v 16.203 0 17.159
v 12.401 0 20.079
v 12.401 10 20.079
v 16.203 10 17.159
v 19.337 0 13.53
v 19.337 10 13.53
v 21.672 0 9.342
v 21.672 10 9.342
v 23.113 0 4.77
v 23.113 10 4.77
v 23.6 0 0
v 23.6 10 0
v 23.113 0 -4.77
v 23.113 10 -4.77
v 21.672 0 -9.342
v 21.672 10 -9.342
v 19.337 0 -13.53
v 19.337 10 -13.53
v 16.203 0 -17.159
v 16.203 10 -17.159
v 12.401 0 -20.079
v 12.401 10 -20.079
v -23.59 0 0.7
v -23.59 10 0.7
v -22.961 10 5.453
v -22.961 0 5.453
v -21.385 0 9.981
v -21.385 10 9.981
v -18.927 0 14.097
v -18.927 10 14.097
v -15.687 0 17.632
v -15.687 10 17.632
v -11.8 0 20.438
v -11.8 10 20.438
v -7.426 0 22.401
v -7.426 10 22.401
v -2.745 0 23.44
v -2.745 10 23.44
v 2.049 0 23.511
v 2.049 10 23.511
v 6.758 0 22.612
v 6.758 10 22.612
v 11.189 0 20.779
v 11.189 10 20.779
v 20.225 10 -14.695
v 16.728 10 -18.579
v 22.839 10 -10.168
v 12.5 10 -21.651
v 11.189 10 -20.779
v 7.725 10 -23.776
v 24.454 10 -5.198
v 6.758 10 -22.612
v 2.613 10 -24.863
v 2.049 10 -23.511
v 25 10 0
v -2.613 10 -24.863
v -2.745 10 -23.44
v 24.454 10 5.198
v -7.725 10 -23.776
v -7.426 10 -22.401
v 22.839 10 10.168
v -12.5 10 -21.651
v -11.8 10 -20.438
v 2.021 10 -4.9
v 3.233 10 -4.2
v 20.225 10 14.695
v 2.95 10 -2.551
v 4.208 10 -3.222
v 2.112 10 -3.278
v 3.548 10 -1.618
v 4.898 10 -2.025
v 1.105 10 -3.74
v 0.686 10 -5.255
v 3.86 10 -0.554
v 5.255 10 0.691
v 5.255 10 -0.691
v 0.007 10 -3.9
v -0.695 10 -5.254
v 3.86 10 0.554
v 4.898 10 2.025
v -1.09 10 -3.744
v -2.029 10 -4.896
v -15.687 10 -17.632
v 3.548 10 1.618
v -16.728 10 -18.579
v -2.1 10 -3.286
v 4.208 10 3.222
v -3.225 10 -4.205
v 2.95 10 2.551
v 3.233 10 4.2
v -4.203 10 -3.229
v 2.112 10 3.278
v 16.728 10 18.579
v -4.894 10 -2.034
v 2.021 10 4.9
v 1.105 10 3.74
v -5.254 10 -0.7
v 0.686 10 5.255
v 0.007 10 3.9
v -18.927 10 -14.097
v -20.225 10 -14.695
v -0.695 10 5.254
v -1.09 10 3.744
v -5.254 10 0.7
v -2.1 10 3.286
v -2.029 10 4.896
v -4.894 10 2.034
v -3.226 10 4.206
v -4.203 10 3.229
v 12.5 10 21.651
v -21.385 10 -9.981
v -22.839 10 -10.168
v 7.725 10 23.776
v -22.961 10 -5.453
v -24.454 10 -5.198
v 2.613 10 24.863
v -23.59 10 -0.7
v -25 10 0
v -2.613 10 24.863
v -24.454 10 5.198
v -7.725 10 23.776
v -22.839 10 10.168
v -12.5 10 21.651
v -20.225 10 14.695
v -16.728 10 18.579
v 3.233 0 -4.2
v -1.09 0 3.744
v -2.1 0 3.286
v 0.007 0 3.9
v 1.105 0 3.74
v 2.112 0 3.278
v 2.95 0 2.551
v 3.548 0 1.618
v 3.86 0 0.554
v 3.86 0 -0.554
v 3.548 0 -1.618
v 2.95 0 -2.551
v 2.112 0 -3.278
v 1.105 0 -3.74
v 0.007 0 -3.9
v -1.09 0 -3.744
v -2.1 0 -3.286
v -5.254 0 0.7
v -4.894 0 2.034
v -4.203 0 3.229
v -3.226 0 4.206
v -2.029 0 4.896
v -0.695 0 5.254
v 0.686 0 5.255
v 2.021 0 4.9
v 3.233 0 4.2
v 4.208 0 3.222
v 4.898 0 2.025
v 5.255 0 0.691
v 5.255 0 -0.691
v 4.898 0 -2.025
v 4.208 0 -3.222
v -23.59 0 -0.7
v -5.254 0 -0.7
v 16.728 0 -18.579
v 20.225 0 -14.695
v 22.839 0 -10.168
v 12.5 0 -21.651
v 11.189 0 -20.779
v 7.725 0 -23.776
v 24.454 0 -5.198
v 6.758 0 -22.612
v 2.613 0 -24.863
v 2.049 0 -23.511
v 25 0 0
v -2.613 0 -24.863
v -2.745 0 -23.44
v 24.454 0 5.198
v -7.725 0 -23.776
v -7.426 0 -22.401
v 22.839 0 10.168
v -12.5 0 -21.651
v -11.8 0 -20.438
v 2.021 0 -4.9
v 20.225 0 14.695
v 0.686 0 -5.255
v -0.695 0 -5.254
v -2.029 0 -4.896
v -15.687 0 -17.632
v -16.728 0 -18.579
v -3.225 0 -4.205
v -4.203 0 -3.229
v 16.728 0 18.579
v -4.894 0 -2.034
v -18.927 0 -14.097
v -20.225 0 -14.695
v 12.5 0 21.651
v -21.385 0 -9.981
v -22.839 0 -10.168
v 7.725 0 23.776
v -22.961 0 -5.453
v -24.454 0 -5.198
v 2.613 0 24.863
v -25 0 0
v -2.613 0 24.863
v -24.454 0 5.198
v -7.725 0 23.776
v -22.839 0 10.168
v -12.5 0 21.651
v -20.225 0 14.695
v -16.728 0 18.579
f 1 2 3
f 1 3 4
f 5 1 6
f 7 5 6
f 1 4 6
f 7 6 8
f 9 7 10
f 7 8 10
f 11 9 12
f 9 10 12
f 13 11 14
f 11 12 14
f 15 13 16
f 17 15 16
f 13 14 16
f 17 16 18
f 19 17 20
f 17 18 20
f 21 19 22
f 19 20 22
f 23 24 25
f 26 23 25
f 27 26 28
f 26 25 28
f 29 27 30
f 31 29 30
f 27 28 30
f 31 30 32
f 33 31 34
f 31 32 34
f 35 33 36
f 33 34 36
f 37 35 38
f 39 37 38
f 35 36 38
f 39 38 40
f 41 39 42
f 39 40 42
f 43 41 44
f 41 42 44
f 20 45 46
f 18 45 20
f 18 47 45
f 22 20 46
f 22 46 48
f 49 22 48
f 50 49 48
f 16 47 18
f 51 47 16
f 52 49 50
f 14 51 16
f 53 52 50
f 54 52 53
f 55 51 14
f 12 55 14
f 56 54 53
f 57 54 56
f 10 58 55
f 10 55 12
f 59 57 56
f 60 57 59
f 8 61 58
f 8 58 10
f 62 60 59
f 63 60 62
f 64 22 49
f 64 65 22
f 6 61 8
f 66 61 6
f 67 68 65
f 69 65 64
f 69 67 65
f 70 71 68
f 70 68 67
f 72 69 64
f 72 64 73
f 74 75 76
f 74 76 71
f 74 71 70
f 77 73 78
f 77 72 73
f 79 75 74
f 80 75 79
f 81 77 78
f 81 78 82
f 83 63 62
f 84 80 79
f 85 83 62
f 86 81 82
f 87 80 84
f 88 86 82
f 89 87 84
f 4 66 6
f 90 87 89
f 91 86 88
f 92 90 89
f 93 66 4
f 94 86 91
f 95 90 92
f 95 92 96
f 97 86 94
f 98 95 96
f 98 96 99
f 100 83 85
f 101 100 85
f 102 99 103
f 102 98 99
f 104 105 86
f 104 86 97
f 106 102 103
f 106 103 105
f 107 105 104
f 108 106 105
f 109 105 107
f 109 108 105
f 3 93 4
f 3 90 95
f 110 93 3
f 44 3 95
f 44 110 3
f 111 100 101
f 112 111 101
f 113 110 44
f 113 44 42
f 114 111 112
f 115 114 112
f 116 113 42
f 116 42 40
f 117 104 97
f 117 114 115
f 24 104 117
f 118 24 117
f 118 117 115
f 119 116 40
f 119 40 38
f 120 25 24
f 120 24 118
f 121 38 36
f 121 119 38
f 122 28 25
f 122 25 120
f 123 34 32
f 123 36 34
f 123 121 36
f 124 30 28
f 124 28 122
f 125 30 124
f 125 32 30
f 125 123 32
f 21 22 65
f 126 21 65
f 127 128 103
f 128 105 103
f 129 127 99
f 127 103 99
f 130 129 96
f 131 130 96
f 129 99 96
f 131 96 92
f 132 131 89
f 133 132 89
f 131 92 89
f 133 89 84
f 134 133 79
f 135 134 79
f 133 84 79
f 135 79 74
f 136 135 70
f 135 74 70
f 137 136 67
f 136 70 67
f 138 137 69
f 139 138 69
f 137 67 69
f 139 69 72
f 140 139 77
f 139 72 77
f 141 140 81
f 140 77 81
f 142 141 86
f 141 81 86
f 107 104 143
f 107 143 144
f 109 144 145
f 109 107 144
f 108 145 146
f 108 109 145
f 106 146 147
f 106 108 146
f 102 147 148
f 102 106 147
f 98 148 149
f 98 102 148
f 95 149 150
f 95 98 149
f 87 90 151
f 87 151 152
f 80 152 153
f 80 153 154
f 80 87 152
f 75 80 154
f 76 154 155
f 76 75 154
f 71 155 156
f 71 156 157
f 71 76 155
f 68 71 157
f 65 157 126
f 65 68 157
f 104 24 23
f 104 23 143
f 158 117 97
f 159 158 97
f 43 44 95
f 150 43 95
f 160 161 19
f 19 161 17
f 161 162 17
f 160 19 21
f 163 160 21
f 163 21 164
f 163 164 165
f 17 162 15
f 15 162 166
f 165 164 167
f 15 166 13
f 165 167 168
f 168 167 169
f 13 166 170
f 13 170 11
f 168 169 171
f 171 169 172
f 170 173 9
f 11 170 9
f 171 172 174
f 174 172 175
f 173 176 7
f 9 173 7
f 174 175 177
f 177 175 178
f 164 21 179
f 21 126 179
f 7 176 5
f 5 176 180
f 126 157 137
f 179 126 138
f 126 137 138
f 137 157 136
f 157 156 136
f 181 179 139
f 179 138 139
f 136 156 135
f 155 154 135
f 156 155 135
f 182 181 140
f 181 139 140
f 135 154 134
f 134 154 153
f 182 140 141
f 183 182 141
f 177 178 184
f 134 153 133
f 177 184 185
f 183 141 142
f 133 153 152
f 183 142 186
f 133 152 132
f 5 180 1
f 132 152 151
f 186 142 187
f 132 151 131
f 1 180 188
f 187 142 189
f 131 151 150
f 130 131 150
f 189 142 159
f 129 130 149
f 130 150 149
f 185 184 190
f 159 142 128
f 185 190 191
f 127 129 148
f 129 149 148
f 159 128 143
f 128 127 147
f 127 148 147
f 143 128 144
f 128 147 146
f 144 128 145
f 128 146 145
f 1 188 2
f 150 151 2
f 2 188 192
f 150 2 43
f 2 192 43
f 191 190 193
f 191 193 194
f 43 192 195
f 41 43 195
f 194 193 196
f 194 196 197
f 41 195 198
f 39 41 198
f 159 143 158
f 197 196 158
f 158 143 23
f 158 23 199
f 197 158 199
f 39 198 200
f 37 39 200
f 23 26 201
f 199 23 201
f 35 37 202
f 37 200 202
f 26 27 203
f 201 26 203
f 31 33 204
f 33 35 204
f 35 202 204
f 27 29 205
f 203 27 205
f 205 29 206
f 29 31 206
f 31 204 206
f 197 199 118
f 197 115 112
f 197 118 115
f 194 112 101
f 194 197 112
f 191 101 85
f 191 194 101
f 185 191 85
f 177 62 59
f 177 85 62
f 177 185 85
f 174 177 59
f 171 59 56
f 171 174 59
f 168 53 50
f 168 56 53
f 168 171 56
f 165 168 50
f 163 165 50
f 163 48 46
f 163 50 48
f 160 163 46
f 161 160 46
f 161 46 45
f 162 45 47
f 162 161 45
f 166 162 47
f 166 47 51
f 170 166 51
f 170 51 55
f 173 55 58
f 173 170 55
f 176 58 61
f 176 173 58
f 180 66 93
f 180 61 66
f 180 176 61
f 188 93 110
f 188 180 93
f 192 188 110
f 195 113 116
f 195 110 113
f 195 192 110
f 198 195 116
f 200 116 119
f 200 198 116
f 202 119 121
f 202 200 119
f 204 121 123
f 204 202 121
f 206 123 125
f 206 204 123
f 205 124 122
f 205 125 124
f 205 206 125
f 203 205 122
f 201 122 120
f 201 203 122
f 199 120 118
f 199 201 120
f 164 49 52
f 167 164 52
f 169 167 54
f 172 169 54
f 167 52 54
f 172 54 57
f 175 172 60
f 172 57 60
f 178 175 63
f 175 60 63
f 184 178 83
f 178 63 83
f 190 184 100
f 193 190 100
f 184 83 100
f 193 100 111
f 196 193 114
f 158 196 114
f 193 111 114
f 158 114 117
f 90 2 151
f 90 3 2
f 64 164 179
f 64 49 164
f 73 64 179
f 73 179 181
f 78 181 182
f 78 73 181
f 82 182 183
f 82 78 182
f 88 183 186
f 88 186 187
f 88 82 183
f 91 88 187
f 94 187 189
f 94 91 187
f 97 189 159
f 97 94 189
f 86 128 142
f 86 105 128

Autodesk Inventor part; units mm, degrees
ref_plane "YZ Plane" through (0, 0, 0) normal (1, 0, 0) x (0, 1, 0)
ref_plane "XZ Plane" through (0, 0, 0) normal (0, 1, 0) x (-1, 0, 0)
ref_plane "XY Plane" through (0, 0, 0) normal (0, 0, 1) x (1, 0, 0)
sketch "Sketch1" plane through (0, 0, 0) normal (0, 1, 0) x (-1, 0, 0)
  circle A0 centre (0, 0) radius 25
  dimension "d0" = 50
extrude "Extrusion1" add sketch "Sketch1" along normal blind 10
sketch "Sketch2" plane through (0, 10, 0) normal (0, 1, 0) x (1, 0, 0)
  arc A0 (-2.1, -3.2863) -> (-2.1, 3.2863) centre (0, 0) ccw
  line L0 (-2.1, -3.2863) -> (-2.1, 3.2863)
  dimension "d3" = 7.8
  dimension "d4" = 2.1
extrude "Extrusion2" cut sketch "Sketch2" against normal up to surface (10 mm away)
sketch "Sketch3" plane through (0, 10, 0) normal (0, 1, 0) x (1, 0, 0)
  line L0 (-2.1, -3.2863) -> (-2.1, 3.2863) projected
  arc A0 (-2.1, -3.2863) -> (-2.1, 3.2863) centre (0, 0) ccw projected
  circle A1 centre (0, 0) radius 25 projected
  line L1 (-23.5896, -0.7) -> (-5.2536, -0.7)
  line L2 (-23.5896, 0.7) -> (-5.2536, 0.7)
  line L3 (11.1886, 20.7792) -> (2.0206, 4.8997)
  line L4 (12.401, 20.0792) -> (3.233, 4.1997)
  line L5 (12.401, -20.0792) -> (3.233, -4.1997)
  line L6 (11.1886, -20.7792) -> (2.0206, -4.8997)
  arc A2 (3.233, -4.1997) -> (3.233, 4.1997) centre (0, 0) ccw
  arc A3 (12.401, -20.0792) -> (12.401, 20.0792) centre (0, 0) ccw
  arc A4 (2.0206, 4.8997) -> (-5.2536, 0.7) centre (0, 0) ccw
  arc A5 (-5.2536, -0.7) -> (2.0206, -4.8997) centre (0, 0) ccw
  arc A6 (11.1886, 20.7792) -> (-23.5896, 0.7) centre (0, 0) ccw
  arc A7 (-23.5896, -0.7) -> (11.1886, -20.7792) centre (0, 0) ccw
  dimension "d9" = 1.4
  dimension "d12" = 360
extrude "Extrusion3" cut sketch "Sketch3" against normal through all contours L1 A5 L6 A7 | A6 L3 A4 L2 | A3 L5 A2 L4
properties part number "Wheel"
